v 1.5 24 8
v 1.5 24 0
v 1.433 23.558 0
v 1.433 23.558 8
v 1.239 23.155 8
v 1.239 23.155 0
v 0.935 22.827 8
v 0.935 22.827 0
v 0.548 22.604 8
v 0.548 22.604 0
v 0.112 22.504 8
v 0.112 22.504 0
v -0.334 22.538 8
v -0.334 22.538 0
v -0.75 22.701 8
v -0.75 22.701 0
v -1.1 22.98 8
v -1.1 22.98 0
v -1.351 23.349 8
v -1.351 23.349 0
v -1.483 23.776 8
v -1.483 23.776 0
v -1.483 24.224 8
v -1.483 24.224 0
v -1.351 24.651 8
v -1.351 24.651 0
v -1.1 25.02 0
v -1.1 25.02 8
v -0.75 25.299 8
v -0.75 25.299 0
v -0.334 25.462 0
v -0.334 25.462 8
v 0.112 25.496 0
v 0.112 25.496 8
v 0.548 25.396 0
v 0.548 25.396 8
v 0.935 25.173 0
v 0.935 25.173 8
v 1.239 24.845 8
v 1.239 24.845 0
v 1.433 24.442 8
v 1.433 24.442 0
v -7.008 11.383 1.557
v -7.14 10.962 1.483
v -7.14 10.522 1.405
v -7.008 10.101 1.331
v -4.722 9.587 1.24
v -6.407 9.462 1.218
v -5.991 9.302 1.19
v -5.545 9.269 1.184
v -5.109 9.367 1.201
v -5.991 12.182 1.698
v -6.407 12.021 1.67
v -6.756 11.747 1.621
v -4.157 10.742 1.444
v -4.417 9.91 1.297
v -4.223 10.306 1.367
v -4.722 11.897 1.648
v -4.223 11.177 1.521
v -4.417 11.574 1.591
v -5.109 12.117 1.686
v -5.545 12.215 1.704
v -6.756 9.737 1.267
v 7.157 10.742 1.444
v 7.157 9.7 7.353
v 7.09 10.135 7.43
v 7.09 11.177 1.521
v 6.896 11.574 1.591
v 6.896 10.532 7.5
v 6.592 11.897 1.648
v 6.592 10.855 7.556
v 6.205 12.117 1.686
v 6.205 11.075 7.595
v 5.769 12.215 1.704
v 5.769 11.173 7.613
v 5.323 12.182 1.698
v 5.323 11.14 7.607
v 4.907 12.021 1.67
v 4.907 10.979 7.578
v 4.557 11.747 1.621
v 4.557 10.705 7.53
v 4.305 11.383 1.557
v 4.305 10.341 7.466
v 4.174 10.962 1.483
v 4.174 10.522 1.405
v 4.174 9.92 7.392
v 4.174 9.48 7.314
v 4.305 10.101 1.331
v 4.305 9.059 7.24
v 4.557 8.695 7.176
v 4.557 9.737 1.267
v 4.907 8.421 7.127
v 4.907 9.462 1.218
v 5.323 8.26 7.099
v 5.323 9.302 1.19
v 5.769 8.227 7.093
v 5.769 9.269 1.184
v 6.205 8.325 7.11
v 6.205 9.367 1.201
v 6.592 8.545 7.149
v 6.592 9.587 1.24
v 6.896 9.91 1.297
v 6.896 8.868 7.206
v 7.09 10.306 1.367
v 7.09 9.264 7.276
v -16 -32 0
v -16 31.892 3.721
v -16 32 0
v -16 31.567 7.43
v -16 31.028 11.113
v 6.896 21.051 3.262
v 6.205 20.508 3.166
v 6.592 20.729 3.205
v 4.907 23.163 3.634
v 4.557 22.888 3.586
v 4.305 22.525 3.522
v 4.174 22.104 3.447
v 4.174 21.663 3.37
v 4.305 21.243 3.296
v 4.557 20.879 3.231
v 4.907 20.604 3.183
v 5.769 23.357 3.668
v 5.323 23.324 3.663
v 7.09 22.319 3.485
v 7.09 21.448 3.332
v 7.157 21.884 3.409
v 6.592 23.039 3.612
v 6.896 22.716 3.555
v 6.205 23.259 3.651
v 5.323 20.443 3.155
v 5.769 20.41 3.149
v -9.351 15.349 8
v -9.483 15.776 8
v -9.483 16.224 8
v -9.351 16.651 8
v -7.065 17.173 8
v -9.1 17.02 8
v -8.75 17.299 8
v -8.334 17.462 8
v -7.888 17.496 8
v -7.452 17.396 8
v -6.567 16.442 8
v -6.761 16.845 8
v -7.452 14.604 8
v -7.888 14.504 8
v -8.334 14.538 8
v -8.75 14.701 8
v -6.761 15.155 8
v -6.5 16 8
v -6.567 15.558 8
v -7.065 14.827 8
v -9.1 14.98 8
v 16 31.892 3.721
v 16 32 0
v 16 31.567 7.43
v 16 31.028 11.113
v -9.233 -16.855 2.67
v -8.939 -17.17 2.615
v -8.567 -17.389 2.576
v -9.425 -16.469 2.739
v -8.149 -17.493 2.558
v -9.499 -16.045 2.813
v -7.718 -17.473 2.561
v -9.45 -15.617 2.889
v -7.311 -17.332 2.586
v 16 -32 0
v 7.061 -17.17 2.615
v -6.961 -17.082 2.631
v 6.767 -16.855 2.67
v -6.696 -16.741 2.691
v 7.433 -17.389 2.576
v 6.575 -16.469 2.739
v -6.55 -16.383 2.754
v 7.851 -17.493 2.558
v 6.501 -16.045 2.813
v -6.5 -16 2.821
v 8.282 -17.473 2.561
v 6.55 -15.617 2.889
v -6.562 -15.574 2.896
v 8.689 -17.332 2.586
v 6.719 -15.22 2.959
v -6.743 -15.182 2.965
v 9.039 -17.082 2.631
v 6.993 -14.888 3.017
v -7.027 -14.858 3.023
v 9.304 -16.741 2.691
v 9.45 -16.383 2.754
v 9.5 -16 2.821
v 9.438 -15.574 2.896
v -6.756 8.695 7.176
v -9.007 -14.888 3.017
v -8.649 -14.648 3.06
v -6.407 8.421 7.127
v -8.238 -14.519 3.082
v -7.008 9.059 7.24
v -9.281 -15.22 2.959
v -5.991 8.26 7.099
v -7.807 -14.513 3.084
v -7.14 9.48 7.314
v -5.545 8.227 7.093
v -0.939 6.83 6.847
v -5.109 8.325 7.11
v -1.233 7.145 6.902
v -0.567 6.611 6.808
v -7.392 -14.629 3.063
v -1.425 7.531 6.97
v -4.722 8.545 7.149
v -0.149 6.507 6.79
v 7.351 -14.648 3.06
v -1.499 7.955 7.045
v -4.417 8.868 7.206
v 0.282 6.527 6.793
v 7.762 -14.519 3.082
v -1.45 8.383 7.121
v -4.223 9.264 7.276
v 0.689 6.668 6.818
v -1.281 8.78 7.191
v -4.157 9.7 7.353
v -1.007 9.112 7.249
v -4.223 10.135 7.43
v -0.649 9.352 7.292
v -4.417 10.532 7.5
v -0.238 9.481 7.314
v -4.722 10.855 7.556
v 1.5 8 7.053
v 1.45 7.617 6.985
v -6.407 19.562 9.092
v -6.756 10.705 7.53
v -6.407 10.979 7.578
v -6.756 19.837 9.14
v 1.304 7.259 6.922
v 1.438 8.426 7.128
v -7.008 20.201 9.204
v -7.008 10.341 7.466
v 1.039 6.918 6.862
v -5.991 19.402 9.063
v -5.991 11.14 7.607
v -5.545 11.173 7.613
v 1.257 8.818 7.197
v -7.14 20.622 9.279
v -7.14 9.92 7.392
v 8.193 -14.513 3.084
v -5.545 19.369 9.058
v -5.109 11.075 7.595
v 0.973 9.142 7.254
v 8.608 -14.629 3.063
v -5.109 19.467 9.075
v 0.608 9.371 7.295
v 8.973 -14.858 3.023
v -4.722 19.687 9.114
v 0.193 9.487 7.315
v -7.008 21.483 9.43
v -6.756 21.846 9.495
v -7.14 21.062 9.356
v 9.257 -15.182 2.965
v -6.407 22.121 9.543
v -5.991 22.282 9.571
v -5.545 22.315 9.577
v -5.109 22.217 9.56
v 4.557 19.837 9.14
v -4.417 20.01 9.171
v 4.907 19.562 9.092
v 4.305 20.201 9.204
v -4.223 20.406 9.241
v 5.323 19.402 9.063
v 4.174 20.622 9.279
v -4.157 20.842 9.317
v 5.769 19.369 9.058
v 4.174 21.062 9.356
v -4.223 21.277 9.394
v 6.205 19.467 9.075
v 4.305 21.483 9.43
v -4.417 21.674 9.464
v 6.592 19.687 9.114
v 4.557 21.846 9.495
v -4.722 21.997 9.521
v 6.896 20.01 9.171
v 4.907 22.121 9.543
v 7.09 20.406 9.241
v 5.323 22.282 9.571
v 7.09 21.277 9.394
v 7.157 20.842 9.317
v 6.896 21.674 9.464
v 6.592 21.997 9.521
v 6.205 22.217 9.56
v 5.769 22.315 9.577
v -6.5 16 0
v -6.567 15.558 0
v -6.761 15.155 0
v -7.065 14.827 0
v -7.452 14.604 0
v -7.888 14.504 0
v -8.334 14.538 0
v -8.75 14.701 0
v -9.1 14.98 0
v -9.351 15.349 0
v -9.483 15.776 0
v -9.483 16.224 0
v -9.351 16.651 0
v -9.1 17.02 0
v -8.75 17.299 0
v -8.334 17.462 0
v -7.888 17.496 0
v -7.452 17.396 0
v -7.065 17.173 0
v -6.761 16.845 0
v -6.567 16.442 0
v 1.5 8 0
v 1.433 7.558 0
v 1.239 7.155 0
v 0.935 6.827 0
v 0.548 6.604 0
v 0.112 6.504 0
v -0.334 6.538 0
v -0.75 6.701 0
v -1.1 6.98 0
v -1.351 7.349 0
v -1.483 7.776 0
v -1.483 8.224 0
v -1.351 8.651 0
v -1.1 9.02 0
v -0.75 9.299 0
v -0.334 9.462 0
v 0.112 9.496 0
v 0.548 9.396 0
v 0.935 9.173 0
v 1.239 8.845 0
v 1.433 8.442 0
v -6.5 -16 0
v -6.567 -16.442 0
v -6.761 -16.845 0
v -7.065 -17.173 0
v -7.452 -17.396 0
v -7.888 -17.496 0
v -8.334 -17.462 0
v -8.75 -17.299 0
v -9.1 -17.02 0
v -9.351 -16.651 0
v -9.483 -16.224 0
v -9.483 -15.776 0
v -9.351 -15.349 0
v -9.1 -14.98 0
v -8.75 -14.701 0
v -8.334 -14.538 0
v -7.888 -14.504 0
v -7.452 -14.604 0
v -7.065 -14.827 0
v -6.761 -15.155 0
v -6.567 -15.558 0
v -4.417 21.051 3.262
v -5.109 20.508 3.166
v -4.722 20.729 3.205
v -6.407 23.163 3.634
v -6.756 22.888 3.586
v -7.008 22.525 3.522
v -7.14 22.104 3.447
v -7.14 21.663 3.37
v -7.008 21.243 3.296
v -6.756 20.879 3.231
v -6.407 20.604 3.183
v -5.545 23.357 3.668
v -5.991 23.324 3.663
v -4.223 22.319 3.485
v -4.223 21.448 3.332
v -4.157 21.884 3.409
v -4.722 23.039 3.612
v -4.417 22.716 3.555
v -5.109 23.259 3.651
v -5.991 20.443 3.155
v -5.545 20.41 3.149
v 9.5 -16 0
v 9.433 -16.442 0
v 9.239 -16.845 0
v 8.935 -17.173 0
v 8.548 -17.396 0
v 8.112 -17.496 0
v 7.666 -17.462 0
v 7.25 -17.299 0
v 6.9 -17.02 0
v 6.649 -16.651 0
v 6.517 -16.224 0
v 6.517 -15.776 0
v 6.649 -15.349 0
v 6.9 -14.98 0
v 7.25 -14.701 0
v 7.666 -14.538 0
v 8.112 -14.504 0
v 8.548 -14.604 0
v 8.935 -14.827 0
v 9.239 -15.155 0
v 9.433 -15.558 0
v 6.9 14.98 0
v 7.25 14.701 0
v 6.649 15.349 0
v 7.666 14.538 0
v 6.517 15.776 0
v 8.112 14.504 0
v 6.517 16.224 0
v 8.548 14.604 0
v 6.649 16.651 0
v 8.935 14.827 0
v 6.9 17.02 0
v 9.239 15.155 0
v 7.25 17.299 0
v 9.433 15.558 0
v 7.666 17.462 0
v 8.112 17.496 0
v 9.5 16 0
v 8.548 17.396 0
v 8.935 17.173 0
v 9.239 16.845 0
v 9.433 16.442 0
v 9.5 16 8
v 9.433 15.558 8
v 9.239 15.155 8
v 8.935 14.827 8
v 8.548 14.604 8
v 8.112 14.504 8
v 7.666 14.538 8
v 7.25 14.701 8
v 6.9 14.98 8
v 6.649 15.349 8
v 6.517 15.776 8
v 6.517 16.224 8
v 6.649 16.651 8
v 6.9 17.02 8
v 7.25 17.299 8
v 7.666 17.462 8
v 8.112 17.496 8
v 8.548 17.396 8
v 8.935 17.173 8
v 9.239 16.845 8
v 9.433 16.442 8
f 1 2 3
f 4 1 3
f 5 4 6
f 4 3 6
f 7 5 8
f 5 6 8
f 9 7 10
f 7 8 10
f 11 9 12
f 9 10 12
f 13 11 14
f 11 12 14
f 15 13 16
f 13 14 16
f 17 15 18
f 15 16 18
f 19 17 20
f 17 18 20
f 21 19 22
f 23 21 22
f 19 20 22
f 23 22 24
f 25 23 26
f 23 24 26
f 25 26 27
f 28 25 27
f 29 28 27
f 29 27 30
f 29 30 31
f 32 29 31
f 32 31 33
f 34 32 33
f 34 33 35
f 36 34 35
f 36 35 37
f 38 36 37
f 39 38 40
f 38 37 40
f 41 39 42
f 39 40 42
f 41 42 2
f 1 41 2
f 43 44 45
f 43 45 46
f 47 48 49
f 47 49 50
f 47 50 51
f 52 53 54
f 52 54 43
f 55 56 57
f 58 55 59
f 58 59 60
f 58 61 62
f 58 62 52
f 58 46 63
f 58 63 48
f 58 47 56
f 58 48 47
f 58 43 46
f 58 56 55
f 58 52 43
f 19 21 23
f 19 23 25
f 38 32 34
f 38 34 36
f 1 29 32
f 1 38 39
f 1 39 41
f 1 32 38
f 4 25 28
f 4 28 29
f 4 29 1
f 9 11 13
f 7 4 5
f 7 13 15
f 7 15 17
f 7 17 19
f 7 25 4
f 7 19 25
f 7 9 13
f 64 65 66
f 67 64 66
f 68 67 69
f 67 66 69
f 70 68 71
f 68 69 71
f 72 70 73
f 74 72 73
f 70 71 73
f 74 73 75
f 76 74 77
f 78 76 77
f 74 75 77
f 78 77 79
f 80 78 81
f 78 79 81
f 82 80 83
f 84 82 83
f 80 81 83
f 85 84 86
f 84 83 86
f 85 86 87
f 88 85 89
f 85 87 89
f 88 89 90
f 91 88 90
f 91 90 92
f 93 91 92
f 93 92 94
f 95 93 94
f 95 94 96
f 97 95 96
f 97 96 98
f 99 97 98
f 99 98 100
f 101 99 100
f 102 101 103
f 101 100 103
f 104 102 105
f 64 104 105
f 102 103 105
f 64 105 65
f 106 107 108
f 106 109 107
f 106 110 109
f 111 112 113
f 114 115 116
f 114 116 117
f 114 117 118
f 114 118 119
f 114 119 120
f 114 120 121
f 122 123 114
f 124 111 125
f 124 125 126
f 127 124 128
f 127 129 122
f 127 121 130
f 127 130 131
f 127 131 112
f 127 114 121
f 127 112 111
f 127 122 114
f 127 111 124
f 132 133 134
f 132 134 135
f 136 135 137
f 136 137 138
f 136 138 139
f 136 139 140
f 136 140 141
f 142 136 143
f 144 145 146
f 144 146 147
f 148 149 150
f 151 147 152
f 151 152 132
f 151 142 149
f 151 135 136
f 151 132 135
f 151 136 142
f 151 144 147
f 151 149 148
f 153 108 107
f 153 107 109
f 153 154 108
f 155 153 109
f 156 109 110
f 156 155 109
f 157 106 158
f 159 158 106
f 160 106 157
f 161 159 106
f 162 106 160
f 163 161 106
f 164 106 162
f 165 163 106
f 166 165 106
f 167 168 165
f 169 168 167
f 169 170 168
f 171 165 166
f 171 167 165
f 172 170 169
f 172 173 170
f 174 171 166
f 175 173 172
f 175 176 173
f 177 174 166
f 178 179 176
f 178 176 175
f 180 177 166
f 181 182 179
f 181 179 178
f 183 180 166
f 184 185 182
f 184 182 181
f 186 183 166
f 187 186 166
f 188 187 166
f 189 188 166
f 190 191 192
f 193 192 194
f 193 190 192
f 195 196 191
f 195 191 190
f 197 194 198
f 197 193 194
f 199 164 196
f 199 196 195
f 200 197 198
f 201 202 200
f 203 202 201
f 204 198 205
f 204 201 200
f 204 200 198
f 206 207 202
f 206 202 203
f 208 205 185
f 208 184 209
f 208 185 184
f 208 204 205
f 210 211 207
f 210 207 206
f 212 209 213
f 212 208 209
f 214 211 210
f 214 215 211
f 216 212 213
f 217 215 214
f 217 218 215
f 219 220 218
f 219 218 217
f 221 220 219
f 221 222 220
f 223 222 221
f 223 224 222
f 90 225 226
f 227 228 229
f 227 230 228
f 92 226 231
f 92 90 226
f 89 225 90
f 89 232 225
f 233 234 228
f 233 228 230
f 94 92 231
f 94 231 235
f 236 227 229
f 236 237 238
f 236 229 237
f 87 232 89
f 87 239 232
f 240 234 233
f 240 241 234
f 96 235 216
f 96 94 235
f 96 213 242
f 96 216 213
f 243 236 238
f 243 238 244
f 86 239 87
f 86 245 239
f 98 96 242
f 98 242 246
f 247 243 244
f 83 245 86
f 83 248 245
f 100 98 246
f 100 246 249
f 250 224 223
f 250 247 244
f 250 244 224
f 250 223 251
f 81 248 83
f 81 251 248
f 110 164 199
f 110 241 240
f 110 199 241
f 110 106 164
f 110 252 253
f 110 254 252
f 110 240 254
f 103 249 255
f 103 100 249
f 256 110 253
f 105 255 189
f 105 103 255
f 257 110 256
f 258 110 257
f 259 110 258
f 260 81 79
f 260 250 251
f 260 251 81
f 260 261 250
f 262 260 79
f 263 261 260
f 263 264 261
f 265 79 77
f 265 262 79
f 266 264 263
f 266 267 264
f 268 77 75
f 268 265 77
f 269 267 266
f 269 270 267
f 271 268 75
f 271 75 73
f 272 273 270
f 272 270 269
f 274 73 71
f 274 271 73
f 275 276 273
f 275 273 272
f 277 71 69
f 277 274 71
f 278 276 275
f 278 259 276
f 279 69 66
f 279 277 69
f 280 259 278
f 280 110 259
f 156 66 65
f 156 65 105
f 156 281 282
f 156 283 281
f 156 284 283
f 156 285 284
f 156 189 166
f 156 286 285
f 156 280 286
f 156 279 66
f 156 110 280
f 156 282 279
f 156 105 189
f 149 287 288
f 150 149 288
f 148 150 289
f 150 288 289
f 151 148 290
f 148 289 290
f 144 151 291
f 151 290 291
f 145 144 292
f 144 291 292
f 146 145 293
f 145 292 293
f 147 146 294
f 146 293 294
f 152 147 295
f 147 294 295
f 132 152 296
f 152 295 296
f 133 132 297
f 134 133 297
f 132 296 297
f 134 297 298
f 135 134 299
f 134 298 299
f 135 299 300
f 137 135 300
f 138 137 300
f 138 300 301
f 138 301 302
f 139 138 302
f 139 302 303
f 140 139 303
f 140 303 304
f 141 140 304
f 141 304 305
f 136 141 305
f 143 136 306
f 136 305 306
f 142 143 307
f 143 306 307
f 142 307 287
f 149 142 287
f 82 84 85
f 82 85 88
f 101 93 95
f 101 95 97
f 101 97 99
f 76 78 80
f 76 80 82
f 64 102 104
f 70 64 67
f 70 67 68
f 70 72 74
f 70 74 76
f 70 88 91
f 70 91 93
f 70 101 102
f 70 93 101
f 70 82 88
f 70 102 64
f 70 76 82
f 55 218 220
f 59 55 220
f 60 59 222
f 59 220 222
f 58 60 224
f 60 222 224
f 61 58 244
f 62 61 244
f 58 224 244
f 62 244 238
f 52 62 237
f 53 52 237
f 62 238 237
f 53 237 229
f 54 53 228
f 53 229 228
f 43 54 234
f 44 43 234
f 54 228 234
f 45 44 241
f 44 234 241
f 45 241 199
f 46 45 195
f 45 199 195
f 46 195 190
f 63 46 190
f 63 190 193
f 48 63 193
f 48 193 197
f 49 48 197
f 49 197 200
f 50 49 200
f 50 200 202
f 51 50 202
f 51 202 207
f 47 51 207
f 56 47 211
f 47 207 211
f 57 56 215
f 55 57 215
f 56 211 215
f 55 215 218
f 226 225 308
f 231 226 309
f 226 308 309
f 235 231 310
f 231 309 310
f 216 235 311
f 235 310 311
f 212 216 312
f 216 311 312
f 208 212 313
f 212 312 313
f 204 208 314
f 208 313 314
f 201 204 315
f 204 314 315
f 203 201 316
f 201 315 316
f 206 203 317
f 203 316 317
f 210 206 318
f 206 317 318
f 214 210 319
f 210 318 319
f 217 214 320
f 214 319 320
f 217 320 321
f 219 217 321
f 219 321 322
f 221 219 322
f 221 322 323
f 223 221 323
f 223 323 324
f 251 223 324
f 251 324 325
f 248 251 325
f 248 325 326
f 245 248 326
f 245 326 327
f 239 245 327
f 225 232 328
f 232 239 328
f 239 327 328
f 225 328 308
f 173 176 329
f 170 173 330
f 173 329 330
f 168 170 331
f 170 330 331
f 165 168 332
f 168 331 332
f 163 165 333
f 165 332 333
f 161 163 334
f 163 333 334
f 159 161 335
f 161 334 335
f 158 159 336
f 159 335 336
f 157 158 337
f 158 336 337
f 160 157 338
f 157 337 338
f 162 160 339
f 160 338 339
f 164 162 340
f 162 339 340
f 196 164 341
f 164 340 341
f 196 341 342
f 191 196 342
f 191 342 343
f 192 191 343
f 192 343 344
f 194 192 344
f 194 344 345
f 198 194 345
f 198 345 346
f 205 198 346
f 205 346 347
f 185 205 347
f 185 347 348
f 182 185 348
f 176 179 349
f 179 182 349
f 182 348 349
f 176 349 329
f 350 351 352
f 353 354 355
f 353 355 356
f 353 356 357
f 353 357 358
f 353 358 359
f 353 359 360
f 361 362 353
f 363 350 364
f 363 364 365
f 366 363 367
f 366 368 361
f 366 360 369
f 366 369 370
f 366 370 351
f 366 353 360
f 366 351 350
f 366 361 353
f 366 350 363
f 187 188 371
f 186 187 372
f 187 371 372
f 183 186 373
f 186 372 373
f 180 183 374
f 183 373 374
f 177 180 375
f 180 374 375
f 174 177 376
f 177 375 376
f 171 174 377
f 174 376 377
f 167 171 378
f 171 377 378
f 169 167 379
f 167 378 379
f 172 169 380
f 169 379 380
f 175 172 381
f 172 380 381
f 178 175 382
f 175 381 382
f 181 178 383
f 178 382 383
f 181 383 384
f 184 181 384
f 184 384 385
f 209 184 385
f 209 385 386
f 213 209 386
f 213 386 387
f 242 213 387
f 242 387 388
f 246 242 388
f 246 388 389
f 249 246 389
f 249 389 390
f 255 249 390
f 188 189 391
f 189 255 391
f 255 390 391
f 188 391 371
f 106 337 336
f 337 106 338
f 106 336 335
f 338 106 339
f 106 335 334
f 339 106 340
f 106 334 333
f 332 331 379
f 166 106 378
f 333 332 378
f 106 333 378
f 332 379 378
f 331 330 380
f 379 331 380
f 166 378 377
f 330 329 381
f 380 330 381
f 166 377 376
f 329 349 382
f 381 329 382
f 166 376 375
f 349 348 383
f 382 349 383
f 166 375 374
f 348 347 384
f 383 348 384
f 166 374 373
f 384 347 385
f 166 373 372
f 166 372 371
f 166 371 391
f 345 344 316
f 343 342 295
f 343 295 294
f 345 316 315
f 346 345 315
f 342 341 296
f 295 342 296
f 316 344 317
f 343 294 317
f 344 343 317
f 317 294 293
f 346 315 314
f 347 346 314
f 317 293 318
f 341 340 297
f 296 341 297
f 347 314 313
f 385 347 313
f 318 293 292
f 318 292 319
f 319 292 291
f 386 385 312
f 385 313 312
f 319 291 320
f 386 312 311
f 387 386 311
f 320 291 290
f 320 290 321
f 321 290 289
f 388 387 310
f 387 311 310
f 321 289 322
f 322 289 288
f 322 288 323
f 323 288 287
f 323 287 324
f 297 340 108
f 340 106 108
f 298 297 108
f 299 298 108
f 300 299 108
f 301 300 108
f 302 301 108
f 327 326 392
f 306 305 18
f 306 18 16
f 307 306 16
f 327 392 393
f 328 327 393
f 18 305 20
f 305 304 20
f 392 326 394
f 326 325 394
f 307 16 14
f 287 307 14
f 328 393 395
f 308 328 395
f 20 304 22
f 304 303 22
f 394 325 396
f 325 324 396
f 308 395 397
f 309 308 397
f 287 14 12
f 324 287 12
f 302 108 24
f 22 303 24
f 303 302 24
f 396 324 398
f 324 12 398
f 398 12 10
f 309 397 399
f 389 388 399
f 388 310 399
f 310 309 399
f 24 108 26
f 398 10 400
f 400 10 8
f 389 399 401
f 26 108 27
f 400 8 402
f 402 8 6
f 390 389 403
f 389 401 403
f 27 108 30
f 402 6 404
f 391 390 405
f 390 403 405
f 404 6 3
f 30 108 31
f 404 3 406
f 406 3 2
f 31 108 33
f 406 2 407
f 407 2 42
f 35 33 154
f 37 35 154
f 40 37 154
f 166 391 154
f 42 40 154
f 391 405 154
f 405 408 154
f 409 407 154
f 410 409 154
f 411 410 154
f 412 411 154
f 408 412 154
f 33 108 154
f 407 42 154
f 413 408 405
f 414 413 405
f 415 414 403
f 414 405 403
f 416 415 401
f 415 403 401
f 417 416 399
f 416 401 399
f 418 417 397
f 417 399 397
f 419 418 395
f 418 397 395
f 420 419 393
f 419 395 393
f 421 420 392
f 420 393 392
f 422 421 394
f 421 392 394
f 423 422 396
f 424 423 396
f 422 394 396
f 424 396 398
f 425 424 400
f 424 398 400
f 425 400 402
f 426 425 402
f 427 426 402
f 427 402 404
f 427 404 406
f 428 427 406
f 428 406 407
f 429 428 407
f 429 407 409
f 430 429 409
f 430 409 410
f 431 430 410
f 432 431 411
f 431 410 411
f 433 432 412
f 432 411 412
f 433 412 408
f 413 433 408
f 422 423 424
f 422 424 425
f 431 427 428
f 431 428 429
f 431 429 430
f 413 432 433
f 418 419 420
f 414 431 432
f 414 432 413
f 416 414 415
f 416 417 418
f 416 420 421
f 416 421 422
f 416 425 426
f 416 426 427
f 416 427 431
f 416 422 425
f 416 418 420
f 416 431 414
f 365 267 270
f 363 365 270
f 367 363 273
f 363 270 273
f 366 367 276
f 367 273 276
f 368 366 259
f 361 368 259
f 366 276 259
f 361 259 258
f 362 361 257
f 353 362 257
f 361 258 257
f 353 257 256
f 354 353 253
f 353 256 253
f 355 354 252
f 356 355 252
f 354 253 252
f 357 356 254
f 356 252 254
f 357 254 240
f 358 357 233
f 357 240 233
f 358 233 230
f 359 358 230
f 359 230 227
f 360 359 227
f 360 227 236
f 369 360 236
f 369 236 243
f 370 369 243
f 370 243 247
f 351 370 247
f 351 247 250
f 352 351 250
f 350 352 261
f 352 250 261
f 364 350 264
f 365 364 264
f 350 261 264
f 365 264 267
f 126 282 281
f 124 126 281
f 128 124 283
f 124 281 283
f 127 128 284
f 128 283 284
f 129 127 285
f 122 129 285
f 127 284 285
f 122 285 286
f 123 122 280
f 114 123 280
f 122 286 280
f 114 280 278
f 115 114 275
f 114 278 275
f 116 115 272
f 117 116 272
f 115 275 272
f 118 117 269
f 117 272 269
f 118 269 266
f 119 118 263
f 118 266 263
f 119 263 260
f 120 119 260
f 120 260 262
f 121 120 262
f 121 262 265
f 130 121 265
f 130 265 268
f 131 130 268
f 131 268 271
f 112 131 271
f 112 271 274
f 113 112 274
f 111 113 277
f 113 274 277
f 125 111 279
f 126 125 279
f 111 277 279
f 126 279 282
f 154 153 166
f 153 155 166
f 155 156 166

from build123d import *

# Parameters (mm, degrees)
F0_W     = 32
F0_H     = 64
F1_ANGLE = 10
F2_R     = 1.5
F3_DEPTH = 6
F4_R     = 1.5
F5_DEPTH = 8


with BuildPart() as f1:
    # F0 (on Top) → F1 (revolve)
    with BuildSketch(Plane.XY):
        Rectangle(F0_W, F0_H)
    revolve(axis=Axis((0, -32, 0), (1, 0, 0)), revolution_arc=F1_ANGLE)

    # F2 (on face) → F3 (cut)
    with BuildSketch(Plane(origin=(0, -0.9649180674, 5.4723222932), x_dir=(1, 0, 0), z_dir=(0, -0.1736481777, 0.984807753))):
        with Locations((-5.6568542495, 22.1430061531)):
            Circle(F2_R)
        with Locations((5.6568542495, 22.1430061531)):
            Circle(F2_R)
        with Locations((5.6568542495, 10.8292976541)):
            Circle(F2_R)
        with Locations((-5.6568542495, 10.8292976541)):
            Circle(F2_R)
    extrude(amount=-F3_DEPTH, mode=Mode.SUBTRACT)

    # F4 (on face) → F5 (cut)
    with BuildSketch(Plane(origin=(0, 0, 0), x_dir=(1, 0, 0), z_dir=(0, 0, -1))):
        with Locations((0, -8)):
            Circle(F4_R)
        with Locations((8, -16)):
            Circle(F4_R)
        with Locations((0, -24)):
            Circle(F4_R)
        with Locations((-8, -16)):
            Circle(F4_R)
        with Locations((-8, 16)):
            Circle(F4_R)
        with Locations((8, 16)):
            Circle(F4_R)
    extrude(amount=-F5_DEPTH, mode=Mode.SUBTRACT)


solid = f1.part
